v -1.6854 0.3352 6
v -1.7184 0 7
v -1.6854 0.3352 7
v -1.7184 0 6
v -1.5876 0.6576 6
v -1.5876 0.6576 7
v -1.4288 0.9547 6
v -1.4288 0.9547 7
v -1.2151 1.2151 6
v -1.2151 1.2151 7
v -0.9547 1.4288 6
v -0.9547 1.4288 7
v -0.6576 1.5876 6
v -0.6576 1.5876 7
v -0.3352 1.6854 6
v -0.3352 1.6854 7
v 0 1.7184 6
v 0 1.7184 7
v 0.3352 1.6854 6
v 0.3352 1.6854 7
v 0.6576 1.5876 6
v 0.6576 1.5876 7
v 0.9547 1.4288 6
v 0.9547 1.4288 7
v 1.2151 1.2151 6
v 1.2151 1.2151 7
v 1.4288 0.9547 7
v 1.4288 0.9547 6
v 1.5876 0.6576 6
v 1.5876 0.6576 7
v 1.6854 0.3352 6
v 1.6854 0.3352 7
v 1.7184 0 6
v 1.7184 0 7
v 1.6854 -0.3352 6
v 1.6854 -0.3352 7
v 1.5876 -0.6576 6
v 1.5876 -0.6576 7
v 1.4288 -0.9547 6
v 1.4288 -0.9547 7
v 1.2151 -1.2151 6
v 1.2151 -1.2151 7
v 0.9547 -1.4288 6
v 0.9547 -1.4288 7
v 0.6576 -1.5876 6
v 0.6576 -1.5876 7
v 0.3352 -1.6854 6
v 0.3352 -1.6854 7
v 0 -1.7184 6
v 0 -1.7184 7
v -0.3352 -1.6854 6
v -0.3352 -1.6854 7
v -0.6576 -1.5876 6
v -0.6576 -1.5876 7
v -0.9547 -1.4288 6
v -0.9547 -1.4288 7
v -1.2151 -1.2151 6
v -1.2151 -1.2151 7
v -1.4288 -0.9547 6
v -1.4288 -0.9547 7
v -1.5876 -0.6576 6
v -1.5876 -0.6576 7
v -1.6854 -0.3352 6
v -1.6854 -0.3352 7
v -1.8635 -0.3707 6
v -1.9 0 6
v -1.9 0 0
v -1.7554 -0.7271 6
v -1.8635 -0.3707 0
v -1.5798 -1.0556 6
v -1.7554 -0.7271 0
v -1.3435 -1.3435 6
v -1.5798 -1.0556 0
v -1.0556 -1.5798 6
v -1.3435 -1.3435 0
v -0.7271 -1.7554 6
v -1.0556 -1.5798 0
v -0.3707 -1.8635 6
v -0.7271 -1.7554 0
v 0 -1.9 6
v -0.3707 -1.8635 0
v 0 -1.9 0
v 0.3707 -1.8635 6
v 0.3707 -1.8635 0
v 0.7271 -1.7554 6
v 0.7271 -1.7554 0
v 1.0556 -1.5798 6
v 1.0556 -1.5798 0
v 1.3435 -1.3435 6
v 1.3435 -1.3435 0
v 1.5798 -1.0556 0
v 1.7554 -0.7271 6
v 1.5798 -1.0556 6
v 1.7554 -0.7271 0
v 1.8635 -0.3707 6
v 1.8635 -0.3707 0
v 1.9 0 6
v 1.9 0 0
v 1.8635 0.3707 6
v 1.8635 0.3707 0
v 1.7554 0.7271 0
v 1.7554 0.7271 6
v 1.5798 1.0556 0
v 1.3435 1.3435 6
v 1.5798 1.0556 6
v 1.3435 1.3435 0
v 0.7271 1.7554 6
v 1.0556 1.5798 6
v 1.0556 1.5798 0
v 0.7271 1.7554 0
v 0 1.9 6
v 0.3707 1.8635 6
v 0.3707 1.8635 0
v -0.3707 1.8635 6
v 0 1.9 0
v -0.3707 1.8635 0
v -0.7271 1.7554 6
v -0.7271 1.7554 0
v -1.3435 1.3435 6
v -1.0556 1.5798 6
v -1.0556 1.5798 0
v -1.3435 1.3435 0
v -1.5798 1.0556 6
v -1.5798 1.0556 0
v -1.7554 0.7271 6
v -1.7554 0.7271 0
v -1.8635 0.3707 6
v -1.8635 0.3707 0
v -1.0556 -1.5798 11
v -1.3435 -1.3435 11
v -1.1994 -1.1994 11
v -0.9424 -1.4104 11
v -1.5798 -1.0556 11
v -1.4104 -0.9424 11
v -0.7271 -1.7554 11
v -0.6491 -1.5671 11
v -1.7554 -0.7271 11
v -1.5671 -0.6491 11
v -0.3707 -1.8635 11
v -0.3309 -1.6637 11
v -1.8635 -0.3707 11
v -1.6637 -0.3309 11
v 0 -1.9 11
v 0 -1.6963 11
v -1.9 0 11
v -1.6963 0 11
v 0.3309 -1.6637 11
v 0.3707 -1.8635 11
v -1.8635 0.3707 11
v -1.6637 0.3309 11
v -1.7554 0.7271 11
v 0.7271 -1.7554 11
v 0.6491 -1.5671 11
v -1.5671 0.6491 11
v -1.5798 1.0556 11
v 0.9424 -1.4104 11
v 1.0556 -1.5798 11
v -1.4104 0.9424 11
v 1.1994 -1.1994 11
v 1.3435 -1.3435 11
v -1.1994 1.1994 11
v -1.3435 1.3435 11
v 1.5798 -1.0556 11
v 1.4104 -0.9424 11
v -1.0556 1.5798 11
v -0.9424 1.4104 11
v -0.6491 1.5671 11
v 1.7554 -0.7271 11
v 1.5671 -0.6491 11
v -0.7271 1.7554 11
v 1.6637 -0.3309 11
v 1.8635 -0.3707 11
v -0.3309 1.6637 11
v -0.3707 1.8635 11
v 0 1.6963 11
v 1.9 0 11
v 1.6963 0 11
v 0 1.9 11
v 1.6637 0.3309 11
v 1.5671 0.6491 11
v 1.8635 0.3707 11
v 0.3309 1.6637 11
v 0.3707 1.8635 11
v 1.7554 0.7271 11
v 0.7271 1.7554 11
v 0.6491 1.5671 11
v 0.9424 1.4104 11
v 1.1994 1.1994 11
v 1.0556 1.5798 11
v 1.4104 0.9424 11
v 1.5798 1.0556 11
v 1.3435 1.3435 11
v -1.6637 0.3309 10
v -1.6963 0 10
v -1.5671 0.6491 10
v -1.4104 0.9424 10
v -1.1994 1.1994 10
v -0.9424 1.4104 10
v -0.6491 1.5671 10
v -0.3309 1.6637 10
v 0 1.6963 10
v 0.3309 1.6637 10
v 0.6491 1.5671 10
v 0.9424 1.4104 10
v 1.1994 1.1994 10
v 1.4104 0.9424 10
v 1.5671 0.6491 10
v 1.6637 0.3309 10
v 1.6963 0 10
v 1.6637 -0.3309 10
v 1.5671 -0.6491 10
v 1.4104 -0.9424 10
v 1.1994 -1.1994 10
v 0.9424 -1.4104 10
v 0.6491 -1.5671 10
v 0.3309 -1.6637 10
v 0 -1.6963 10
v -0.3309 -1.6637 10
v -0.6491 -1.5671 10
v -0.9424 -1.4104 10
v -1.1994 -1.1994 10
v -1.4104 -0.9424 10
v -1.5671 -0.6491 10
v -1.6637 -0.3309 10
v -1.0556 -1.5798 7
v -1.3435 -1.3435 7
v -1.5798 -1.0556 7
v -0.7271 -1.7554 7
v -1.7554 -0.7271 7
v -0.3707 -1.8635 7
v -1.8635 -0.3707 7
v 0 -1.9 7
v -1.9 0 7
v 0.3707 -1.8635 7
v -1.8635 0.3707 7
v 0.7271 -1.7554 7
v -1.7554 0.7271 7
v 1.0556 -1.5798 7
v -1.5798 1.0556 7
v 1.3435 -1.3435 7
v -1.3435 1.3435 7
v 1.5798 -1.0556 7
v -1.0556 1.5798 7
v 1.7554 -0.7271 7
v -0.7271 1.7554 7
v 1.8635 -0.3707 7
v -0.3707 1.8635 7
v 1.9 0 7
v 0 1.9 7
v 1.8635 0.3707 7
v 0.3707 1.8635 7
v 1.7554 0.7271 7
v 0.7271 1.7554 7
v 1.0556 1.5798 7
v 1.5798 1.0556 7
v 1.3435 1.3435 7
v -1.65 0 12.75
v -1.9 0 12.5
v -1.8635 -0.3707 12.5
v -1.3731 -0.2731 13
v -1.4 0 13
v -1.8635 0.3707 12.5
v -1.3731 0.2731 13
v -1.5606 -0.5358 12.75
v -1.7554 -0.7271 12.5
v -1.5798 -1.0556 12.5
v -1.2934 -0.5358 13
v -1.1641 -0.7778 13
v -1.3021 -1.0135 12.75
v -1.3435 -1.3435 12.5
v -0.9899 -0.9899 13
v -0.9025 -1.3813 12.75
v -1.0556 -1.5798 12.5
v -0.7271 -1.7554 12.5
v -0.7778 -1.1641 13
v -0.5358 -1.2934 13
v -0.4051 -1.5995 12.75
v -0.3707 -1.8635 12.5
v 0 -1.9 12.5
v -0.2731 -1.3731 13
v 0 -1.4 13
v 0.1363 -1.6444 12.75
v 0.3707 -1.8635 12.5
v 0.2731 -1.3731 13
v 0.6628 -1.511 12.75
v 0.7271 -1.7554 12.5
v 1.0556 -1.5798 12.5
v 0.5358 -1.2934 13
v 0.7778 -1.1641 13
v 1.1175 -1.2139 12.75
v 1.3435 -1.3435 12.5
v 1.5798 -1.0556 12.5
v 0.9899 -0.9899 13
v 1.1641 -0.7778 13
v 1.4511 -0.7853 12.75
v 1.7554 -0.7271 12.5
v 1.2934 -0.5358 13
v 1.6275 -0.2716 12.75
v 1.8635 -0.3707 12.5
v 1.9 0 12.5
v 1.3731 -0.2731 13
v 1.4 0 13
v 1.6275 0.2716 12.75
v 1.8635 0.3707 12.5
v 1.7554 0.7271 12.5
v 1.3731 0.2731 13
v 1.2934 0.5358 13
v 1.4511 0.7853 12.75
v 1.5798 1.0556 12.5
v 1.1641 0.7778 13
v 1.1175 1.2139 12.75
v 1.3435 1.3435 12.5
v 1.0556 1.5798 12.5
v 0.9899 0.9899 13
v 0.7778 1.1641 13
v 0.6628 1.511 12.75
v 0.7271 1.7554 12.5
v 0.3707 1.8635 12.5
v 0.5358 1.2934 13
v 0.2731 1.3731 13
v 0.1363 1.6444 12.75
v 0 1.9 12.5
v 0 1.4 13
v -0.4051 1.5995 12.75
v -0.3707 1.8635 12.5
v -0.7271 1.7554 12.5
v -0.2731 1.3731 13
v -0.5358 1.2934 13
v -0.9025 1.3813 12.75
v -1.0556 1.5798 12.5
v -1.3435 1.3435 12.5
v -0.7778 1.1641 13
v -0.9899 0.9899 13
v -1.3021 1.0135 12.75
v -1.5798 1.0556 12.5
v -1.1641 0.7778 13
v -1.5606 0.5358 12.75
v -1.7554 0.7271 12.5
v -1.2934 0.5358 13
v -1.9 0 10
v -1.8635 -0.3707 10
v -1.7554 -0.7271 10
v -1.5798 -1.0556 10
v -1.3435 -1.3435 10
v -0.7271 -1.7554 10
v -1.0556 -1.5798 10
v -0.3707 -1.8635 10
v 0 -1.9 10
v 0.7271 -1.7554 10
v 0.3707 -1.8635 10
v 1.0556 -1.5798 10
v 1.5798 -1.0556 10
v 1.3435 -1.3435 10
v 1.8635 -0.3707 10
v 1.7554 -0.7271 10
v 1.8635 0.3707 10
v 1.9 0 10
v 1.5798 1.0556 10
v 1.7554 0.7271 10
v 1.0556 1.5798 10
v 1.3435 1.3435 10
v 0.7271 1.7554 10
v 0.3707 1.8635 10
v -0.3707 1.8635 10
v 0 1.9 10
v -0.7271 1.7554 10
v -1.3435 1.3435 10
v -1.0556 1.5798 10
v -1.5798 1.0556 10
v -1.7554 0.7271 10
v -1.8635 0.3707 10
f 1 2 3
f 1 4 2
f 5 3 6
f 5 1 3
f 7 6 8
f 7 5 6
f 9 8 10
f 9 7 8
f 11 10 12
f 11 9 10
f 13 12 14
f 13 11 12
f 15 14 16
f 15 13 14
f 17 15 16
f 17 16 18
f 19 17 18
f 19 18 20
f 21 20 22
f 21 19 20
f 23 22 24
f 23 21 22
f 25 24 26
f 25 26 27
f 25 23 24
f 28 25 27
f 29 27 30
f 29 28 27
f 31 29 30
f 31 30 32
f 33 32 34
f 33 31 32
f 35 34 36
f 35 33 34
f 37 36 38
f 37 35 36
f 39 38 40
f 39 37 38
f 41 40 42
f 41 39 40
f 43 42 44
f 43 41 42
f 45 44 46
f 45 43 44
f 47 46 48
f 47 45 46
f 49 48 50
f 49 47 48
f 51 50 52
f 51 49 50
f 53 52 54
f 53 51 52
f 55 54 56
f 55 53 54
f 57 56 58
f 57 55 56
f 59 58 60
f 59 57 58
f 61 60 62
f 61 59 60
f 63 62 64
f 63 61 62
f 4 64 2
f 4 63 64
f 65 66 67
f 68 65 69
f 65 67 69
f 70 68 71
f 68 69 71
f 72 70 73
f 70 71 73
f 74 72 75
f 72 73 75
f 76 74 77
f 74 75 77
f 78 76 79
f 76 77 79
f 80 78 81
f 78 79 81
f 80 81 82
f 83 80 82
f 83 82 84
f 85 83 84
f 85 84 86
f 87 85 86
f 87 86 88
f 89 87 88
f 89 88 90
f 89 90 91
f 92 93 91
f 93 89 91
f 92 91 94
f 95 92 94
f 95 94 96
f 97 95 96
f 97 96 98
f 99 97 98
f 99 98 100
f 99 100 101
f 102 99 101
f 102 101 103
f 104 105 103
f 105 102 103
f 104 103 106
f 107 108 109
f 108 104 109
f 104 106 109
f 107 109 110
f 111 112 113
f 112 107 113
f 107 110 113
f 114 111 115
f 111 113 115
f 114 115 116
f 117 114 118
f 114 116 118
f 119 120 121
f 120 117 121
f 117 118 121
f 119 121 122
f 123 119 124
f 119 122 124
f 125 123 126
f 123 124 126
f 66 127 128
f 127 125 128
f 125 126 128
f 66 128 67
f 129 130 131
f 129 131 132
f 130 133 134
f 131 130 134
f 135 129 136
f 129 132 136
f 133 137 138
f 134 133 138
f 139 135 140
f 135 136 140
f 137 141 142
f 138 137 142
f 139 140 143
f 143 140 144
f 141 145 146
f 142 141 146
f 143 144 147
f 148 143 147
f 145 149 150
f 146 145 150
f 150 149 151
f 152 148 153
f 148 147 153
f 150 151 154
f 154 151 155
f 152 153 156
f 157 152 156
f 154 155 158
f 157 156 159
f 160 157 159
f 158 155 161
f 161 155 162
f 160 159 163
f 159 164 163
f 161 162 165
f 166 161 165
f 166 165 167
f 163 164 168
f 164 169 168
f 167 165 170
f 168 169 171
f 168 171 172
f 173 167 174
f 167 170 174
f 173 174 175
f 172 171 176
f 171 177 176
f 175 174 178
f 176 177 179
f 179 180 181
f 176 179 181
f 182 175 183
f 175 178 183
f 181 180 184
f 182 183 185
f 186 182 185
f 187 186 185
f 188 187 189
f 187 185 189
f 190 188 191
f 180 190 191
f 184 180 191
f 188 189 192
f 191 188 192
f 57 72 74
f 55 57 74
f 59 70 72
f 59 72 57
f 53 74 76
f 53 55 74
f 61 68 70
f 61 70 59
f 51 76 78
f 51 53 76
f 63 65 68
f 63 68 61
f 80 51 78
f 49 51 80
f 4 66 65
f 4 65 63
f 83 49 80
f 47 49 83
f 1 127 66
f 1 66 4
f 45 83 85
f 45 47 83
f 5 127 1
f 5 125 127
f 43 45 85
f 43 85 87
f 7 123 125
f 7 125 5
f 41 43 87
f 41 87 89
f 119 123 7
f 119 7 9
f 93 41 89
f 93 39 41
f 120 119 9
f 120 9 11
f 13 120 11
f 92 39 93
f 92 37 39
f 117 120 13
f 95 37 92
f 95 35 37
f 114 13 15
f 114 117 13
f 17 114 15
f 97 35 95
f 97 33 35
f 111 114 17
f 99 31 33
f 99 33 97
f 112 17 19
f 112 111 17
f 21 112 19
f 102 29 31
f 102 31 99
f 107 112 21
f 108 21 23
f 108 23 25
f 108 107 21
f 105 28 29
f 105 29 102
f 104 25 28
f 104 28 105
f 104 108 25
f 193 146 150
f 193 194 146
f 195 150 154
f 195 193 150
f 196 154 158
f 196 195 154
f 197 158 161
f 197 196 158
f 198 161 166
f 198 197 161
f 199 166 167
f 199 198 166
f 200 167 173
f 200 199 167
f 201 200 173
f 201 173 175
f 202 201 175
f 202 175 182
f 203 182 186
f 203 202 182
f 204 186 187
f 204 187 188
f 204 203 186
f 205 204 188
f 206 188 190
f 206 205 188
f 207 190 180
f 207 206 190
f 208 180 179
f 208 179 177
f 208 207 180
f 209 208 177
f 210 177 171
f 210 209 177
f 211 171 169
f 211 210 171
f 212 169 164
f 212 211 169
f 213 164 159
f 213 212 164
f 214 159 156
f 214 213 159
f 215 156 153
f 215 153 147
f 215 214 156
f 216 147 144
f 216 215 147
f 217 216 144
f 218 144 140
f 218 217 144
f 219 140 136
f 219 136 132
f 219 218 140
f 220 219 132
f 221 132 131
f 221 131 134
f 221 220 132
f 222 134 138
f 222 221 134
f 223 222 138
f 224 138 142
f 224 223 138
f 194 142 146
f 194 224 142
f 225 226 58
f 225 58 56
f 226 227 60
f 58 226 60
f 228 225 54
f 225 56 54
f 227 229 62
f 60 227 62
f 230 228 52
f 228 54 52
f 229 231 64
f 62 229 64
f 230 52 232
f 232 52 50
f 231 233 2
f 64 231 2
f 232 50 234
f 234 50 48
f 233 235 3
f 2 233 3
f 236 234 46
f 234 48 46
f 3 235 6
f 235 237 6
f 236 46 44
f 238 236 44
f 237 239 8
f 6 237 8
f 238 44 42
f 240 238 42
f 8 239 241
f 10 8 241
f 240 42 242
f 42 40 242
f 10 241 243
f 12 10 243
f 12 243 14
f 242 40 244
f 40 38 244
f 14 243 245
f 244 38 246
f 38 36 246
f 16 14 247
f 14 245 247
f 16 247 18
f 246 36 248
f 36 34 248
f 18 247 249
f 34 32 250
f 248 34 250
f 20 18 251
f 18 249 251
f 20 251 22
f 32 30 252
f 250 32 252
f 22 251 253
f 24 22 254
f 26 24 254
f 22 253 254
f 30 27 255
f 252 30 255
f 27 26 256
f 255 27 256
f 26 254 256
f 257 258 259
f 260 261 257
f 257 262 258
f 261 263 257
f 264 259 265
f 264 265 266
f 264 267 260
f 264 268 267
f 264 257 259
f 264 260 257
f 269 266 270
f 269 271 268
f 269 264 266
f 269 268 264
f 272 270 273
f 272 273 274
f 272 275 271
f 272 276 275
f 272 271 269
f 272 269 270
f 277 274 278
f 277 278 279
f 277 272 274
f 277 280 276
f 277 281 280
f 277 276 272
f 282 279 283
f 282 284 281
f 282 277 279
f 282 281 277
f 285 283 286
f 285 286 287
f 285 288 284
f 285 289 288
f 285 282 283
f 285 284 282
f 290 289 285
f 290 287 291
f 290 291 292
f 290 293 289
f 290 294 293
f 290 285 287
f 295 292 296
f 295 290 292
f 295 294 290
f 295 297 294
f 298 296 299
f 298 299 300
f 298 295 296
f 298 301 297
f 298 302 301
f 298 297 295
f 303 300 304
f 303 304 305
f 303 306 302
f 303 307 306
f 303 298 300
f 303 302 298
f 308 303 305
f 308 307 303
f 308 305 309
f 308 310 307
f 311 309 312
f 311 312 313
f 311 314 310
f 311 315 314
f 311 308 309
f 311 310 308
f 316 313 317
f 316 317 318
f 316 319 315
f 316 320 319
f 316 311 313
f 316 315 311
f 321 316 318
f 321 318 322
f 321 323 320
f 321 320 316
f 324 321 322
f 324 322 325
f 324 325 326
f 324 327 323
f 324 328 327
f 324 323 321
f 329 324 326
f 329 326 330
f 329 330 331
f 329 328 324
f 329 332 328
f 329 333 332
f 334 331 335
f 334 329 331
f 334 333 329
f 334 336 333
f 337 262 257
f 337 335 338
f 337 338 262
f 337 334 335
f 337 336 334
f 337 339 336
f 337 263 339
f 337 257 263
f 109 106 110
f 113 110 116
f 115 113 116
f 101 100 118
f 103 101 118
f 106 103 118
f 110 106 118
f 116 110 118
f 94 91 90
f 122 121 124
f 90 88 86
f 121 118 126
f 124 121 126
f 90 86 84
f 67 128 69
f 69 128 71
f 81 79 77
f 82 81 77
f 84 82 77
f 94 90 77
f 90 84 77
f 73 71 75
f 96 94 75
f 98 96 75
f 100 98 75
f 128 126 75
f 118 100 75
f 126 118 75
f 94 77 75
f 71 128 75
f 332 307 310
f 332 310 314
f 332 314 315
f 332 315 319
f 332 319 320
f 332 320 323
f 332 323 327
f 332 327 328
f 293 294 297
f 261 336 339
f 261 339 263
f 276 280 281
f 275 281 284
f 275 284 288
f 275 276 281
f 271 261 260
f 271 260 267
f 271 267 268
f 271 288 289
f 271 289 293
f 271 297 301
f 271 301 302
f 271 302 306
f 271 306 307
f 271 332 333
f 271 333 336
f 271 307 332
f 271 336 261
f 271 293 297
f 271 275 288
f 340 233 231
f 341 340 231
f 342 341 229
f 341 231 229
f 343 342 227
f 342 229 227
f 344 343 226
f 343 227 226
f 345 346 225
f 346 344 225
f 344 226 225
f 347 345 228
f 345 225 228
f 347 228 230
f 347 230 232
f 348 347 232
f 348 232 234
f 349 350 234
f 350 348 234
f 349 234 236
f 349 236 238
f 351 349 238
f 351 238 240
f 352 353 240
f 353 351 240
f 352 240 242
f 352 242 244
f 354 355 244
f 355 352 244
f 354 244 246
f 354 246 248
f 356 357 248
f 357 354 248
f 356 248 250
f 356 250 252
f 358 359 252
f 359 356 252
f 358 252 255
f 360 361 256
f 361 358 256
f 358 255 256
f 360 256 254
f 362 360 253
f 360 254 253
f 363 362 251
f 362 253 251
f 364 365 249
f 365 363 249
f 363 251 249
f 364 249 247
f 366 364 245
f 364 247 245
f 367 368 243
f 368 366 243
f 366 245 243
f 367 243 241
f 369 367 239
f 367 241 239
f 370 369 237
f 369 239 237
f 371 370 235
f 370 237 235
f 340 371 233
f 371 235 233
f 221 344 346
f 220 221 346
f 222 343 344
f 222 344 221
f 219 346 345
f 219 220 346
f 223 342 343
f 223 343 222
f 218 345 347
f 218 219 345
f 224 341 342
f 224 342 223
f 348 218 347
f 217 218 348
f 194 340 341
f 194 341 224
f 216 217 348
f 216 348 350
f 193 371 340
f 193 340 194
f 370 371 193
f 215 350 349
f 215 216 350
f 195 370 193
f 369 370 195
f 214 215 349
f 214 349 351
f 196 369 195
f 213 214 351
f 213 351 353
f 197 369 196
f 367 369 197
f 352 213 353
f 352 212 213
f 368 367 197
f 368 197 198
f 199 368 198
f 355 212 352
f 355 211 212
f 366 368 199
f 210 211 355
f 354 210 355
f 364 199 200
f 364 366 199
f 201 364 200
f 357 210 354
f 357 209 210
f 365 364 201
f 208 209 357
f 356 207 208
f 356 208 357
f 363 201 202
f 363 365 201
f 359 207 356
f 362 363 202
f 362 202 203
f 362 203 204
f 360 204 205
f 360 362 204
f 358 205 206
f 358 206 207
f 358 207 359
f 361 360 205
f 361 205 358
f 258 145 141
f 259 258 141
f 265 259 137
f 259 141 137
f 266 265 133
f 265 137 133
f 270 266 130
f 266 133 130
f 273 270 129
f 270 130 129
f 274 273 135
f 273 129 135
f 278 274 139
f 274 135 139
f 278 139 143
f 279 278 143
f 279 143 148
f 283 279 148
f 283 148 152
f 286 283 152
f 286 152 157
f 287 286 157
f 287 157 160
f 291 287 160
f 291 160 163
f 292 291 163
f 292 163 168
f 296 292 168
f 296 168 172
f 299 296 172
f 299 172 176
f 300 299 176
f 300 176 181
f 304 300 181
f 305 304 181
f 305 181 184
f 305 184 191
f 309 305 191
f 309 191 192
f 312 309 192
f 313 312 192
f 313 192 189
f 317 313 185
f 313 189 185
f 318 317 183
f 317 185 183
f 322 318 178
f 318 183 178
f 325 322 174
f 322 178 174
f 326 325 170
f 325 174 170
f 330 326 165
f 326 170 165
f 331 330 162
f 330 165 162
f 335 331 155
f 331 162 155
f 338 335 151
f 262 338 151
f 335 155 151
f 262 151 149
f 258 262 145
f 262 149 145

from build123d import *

# Parameters (mm, degrees)
SKETCH1_R           = 1.9
BOSS_EXTRUDE1_DEPTH = 13
CHAMFER1_SIZE       = 0.5
SKETCH4_W           = 1
SKETCH4_H           = 0.407466182
SKETCH7_W           = 1
SKETCH7_H           = 0.36313202


with BuildPart() as part:
    # Sketch1 → Boss-Extrude1 (new body)
    with BuildSketch(Plane.XY):
        with Locations(Location((0, 0, 0), (0, 0, 180))):
            Circle(SKETCH1_R)
    extrude(amount=BOSS_EXTRUDE1_DEPTH)

    # Chamfer1
    chamfer1_edges = [part.edges().sort_by_distance(p)[0] for p in [
        (1.9, 0, 13),
    ]]
    chamfer(chamfer1_edges, length=CHAMFER1_SIZE)

    # Sketch4 → Cut-Revolve4 (revolve, cut)
    with BuildSketch(Plane(origin=(0, 0, 0), x_dir=(0, 0, -1), z_dir=(1, 0, 0)), mode=Mode.PRIVATE) as cut_revolve4_sk:
        with Locations((-10.5, 1.9)):
            Rectangle(SKETCH4_W, SKETCH4_H)
    revolve(cut_revolve4_sk.sketch.rotate(Axis((0, 0, 14.953462275), (0, 0, -1)), 270), axis=Axis((0, 0, 14.953462275), (0, 0, -1)), mode=Mode.SUBTRACT)

    # Sketch7 → Cut-Revolve7 (revolve, cut)
    with BuildSketch(Plane(origin=(0, 0, 0), x_dir=(0, 0, -1), z_dir=(1, 0, 0)), mode=Mode.PRIVATE) as cut_revolve7_sk:
        with Locations((-6.5, 1.9)):
            Rectangle(SKETCH7_W, SKETCH7_H)
    revolve(cut_revolve7_sk.sketch.rotate(Axis((0, 0, 14.336983713), (0, 0, -1)), 270), axis=Axis((0, 0, 14.336983713), (0, 0, -1)), mode=Mode.SUBTRACT)


solid = part.part
